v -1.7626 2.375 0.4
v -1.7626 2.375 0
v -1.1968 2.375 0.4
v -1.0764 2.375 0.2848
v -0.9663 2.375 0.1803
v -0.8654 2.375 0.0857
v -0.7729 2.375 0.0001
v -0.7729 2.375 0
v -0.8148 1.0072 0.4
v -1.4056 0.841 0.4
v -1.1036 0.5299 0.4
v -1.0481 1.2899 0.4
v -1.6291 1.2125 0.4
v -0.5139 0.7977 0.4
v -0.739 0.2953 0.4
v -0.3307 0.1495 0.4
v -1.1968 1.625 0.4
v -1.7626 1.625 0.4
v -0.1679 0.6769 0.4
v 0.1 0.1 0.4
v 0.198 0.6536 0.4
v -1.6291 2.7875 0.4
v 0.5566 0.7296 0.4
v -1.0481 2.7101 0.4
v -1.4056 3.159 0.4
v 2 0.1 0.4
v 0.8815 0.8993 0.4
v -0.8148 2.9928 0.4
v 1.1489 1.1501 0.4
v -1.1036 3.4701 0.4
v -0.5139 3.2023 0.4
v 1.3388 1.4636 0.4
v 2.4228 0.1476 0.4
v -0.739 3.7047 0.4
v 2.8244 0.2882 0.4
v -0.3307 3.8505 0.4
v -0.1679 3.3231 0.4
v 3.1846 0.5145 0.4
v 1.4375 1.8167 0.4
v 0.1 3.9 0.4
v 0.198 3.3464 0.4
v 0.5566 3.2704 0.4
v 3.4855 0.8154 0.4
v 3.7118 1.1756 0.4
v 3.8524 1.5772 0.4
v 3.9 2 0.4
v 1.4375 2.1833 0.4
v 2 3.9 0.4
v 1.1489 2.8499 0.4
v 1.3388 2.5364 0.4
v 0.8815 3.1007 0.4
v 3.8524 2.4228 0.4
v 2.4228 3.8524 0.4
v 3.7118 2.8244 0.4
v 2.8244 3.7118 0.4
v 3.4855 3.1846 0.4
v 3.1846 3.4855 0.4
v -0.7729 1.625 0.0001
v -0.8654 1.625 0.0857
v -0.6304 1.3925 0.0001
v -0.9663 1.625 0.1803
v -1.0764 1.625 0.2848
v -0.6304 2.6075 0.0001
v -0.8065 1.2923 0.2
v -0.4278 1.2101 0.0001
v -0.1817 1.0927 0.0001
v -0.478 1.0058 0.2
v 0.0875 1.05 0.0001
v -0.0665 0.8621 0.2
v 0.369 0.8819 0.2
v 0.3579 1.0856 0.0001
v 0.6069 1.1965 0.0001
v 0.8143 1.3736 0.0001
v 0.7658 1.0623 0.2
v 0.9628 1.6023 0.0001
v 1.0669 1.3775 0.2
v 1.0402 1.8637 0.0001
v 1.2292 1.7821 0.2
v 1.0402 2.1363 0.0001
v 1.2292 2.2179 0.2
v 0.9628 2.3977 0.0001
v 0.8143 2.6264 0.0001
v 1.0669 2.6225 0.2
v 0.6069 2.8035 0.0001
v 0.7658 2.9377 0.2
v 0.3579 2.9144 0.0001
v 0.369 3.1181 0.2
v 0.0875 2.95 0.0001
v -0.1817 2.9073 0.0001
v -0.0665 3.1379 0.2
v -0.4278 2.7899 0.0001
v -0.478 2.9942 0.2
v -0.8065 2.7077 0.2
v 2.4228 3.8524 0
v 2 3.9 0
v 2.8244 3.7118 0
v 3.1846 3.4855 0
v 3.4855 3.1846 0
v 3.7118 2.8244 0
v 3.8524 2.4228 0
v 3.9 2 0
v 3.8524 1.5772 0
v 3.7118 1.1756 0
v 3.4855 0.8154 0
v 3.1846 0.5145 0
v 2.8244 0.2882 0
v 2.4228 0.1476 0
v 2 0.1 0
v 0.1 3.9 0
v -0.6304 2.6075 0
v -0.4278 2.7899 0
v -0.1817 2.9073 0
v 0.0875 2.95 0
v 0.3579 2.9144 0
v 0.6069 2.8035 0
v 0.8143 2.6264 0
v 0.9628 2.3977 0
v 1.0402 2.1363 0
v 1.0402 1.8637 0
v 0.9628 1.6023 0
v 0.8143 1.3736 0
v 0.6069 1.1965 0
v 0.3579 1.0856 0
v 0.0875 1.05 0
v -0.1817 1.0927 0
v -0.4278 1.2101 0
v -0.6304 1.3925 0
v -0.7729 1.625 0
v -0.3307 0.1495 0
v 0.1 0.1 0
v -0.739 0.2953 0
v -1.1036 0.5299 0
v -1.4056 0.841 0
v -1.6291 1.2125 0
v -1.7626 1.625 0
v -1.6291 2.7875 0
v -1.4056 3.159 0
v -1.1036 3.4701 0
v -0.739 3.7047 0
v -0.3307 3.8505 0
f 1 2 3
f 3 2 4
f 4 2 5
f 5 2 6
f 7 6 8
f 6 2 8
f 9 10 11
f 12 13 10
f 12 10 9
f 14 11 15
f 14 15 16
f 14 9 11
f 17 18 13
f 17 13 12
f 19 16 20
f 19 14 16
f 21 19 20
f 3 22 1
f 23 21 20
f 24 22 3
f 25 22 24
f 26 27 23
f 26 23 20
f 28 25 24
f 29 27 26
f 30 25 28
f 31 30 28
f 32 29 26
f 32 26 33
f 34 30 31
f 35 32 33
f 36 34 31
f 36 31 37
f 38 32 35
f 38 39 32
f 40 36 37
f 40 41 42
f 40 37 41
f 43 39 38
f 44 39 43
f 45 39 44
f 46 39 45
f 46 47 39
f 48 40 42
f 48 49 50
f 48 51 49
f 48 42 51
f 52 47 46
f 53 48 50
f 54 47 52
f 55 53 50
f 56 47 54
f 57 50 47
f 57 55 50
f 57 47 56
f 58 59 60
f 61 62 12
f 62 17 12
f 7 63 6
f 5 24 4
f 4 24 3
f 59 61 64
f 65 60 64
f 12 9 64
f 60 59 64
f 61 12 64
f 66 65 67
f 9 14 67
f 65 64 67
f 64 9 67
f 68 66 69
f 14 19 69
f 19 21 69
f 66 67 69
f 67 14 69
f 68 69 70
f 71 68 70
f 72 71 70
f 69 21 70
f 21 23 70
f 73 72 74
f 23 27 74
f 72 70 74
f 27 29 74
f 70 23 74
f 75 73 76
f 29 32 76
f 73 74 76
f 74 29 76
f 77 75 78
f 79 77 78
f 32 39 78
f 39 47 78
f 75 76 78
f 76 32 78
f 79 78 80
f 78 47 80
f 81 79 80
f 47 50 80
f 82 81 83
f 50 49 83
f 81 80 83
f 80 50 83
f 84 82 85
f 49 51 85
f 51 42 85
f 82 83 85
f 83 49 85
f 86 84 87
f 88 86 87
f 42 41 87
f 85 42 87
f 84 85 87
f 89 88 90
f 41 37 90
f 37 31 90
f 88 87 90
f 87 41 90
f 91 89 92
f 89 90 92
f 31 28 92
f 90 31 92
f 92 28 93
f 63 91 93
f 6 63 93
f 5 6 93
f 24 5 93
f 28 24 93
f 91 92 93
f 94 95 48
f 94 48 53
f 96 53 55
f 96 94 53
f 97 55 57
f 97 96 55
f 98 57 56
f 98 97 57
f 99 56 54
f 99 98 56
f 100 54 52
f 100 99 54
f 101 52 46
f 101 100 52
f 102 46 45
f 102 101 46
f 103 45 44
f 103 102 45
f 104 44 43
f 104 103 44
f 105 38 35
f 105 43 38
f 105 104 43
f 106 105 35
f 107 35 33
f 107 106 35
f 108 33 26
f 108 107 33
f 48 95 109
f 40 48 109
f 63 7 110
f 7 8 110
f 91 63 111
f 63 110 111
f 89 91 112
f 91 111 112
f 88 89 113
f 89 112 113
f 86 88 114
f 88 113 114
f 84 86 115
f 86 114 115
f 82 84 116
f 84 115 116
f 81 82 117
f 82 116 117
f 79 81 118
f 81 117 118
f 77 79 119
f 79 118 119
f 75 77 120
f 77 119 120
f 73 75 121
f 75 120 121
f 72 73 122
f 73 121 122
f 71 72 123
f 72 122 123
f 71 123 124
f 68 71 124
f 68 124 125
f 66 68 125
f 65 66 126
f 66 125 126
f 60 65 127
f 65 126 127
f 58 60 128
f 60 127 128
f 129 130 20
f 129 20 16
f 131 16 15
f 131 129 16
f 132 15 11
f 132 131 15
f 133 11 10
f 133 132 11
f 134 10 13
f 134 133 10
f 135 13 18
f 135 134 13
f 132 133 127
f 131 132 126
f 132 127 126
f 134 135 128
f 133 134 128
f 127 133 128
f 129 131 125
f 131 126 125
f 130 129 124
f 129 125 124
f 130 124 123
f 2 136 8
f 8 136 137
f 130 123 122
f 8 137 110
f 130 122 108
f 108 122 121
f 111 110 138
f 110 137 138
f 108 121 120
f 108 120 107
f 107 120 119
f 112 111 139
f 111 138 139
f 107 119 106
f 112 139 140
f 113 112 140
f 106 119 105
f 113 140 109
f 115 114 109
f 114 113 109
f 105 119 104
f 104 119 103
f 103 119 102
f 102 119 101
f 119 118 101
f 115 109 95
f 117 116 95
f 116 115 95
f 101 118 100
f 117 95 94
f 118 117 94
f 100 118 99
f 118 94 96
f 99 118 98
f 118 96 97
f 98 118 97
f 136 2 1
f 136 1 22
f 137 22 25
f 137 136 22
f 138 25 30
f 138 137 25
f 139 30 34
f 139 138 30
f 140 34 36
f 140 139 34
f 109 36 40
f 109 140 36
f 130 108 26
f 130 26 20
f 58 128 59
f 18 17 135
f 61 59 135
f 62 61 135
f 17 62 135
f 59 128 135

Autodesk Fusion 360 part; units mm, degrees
sketch "Sketch1" plane through (0, 0, 0) normal (0, 0, 1) x (1, 0, 0)
  arc A0 (2, 0.1) -> (2, 3.9) centre (2, 2) ccw
  line L0 (2, 0.1) -> (0.1, 0.1)
  line L1 (2, 3.9) -> (0.1, 3.9)
  line L2 (-0.7729, 1.625) -> (-1.7626, 1.625)
  line L3 (-1.7626, 2.375) -> (-0.7729, 2.375)
  arc A1 (0.1, 3.9) -> (-1.7626, 2.375) centre (0.1, 2) ccw
  arc A2 (-1.7626, 1.625) -> (0.1, 0.1) centre (0.1, 2) ccw
  arc A3 (-0.7729, 1.625) -> (-0.7729, 2.375) centre (0.1, 2) ccw
  line L4 (0, 0) -> (10, 0) construction
  dimension "d1" = 3.8
  dimension "d2" = 3.8
  dimension "d3" = 1.9
  dimension "jointrad" = 1.9
  dimension "d5" = 0.375
  dimension "d6" = 0.75
  dimension "ypos" = 2
  dimension "xpos" = 2
  dimension "d17" = 10
  dimension "jointangle" = 180
extrude "Extrude1" add sketch "Sketch1" along normal blind 0.4
chamfer "Chamfer1" distance 0.4 angle 45 1 edges at (1.05, 2, 0.4)
equation "d1 = jointrad * 2"
equation "d2 = d1"
equation "d3 = jointrad"
equation "d5 = ( 0.75 / 2 ) * 1 mm"
equation "d6 = d5 * 2"
equation "jointdepth = 0.4 mm"
equation "d11 = jointdepth"
